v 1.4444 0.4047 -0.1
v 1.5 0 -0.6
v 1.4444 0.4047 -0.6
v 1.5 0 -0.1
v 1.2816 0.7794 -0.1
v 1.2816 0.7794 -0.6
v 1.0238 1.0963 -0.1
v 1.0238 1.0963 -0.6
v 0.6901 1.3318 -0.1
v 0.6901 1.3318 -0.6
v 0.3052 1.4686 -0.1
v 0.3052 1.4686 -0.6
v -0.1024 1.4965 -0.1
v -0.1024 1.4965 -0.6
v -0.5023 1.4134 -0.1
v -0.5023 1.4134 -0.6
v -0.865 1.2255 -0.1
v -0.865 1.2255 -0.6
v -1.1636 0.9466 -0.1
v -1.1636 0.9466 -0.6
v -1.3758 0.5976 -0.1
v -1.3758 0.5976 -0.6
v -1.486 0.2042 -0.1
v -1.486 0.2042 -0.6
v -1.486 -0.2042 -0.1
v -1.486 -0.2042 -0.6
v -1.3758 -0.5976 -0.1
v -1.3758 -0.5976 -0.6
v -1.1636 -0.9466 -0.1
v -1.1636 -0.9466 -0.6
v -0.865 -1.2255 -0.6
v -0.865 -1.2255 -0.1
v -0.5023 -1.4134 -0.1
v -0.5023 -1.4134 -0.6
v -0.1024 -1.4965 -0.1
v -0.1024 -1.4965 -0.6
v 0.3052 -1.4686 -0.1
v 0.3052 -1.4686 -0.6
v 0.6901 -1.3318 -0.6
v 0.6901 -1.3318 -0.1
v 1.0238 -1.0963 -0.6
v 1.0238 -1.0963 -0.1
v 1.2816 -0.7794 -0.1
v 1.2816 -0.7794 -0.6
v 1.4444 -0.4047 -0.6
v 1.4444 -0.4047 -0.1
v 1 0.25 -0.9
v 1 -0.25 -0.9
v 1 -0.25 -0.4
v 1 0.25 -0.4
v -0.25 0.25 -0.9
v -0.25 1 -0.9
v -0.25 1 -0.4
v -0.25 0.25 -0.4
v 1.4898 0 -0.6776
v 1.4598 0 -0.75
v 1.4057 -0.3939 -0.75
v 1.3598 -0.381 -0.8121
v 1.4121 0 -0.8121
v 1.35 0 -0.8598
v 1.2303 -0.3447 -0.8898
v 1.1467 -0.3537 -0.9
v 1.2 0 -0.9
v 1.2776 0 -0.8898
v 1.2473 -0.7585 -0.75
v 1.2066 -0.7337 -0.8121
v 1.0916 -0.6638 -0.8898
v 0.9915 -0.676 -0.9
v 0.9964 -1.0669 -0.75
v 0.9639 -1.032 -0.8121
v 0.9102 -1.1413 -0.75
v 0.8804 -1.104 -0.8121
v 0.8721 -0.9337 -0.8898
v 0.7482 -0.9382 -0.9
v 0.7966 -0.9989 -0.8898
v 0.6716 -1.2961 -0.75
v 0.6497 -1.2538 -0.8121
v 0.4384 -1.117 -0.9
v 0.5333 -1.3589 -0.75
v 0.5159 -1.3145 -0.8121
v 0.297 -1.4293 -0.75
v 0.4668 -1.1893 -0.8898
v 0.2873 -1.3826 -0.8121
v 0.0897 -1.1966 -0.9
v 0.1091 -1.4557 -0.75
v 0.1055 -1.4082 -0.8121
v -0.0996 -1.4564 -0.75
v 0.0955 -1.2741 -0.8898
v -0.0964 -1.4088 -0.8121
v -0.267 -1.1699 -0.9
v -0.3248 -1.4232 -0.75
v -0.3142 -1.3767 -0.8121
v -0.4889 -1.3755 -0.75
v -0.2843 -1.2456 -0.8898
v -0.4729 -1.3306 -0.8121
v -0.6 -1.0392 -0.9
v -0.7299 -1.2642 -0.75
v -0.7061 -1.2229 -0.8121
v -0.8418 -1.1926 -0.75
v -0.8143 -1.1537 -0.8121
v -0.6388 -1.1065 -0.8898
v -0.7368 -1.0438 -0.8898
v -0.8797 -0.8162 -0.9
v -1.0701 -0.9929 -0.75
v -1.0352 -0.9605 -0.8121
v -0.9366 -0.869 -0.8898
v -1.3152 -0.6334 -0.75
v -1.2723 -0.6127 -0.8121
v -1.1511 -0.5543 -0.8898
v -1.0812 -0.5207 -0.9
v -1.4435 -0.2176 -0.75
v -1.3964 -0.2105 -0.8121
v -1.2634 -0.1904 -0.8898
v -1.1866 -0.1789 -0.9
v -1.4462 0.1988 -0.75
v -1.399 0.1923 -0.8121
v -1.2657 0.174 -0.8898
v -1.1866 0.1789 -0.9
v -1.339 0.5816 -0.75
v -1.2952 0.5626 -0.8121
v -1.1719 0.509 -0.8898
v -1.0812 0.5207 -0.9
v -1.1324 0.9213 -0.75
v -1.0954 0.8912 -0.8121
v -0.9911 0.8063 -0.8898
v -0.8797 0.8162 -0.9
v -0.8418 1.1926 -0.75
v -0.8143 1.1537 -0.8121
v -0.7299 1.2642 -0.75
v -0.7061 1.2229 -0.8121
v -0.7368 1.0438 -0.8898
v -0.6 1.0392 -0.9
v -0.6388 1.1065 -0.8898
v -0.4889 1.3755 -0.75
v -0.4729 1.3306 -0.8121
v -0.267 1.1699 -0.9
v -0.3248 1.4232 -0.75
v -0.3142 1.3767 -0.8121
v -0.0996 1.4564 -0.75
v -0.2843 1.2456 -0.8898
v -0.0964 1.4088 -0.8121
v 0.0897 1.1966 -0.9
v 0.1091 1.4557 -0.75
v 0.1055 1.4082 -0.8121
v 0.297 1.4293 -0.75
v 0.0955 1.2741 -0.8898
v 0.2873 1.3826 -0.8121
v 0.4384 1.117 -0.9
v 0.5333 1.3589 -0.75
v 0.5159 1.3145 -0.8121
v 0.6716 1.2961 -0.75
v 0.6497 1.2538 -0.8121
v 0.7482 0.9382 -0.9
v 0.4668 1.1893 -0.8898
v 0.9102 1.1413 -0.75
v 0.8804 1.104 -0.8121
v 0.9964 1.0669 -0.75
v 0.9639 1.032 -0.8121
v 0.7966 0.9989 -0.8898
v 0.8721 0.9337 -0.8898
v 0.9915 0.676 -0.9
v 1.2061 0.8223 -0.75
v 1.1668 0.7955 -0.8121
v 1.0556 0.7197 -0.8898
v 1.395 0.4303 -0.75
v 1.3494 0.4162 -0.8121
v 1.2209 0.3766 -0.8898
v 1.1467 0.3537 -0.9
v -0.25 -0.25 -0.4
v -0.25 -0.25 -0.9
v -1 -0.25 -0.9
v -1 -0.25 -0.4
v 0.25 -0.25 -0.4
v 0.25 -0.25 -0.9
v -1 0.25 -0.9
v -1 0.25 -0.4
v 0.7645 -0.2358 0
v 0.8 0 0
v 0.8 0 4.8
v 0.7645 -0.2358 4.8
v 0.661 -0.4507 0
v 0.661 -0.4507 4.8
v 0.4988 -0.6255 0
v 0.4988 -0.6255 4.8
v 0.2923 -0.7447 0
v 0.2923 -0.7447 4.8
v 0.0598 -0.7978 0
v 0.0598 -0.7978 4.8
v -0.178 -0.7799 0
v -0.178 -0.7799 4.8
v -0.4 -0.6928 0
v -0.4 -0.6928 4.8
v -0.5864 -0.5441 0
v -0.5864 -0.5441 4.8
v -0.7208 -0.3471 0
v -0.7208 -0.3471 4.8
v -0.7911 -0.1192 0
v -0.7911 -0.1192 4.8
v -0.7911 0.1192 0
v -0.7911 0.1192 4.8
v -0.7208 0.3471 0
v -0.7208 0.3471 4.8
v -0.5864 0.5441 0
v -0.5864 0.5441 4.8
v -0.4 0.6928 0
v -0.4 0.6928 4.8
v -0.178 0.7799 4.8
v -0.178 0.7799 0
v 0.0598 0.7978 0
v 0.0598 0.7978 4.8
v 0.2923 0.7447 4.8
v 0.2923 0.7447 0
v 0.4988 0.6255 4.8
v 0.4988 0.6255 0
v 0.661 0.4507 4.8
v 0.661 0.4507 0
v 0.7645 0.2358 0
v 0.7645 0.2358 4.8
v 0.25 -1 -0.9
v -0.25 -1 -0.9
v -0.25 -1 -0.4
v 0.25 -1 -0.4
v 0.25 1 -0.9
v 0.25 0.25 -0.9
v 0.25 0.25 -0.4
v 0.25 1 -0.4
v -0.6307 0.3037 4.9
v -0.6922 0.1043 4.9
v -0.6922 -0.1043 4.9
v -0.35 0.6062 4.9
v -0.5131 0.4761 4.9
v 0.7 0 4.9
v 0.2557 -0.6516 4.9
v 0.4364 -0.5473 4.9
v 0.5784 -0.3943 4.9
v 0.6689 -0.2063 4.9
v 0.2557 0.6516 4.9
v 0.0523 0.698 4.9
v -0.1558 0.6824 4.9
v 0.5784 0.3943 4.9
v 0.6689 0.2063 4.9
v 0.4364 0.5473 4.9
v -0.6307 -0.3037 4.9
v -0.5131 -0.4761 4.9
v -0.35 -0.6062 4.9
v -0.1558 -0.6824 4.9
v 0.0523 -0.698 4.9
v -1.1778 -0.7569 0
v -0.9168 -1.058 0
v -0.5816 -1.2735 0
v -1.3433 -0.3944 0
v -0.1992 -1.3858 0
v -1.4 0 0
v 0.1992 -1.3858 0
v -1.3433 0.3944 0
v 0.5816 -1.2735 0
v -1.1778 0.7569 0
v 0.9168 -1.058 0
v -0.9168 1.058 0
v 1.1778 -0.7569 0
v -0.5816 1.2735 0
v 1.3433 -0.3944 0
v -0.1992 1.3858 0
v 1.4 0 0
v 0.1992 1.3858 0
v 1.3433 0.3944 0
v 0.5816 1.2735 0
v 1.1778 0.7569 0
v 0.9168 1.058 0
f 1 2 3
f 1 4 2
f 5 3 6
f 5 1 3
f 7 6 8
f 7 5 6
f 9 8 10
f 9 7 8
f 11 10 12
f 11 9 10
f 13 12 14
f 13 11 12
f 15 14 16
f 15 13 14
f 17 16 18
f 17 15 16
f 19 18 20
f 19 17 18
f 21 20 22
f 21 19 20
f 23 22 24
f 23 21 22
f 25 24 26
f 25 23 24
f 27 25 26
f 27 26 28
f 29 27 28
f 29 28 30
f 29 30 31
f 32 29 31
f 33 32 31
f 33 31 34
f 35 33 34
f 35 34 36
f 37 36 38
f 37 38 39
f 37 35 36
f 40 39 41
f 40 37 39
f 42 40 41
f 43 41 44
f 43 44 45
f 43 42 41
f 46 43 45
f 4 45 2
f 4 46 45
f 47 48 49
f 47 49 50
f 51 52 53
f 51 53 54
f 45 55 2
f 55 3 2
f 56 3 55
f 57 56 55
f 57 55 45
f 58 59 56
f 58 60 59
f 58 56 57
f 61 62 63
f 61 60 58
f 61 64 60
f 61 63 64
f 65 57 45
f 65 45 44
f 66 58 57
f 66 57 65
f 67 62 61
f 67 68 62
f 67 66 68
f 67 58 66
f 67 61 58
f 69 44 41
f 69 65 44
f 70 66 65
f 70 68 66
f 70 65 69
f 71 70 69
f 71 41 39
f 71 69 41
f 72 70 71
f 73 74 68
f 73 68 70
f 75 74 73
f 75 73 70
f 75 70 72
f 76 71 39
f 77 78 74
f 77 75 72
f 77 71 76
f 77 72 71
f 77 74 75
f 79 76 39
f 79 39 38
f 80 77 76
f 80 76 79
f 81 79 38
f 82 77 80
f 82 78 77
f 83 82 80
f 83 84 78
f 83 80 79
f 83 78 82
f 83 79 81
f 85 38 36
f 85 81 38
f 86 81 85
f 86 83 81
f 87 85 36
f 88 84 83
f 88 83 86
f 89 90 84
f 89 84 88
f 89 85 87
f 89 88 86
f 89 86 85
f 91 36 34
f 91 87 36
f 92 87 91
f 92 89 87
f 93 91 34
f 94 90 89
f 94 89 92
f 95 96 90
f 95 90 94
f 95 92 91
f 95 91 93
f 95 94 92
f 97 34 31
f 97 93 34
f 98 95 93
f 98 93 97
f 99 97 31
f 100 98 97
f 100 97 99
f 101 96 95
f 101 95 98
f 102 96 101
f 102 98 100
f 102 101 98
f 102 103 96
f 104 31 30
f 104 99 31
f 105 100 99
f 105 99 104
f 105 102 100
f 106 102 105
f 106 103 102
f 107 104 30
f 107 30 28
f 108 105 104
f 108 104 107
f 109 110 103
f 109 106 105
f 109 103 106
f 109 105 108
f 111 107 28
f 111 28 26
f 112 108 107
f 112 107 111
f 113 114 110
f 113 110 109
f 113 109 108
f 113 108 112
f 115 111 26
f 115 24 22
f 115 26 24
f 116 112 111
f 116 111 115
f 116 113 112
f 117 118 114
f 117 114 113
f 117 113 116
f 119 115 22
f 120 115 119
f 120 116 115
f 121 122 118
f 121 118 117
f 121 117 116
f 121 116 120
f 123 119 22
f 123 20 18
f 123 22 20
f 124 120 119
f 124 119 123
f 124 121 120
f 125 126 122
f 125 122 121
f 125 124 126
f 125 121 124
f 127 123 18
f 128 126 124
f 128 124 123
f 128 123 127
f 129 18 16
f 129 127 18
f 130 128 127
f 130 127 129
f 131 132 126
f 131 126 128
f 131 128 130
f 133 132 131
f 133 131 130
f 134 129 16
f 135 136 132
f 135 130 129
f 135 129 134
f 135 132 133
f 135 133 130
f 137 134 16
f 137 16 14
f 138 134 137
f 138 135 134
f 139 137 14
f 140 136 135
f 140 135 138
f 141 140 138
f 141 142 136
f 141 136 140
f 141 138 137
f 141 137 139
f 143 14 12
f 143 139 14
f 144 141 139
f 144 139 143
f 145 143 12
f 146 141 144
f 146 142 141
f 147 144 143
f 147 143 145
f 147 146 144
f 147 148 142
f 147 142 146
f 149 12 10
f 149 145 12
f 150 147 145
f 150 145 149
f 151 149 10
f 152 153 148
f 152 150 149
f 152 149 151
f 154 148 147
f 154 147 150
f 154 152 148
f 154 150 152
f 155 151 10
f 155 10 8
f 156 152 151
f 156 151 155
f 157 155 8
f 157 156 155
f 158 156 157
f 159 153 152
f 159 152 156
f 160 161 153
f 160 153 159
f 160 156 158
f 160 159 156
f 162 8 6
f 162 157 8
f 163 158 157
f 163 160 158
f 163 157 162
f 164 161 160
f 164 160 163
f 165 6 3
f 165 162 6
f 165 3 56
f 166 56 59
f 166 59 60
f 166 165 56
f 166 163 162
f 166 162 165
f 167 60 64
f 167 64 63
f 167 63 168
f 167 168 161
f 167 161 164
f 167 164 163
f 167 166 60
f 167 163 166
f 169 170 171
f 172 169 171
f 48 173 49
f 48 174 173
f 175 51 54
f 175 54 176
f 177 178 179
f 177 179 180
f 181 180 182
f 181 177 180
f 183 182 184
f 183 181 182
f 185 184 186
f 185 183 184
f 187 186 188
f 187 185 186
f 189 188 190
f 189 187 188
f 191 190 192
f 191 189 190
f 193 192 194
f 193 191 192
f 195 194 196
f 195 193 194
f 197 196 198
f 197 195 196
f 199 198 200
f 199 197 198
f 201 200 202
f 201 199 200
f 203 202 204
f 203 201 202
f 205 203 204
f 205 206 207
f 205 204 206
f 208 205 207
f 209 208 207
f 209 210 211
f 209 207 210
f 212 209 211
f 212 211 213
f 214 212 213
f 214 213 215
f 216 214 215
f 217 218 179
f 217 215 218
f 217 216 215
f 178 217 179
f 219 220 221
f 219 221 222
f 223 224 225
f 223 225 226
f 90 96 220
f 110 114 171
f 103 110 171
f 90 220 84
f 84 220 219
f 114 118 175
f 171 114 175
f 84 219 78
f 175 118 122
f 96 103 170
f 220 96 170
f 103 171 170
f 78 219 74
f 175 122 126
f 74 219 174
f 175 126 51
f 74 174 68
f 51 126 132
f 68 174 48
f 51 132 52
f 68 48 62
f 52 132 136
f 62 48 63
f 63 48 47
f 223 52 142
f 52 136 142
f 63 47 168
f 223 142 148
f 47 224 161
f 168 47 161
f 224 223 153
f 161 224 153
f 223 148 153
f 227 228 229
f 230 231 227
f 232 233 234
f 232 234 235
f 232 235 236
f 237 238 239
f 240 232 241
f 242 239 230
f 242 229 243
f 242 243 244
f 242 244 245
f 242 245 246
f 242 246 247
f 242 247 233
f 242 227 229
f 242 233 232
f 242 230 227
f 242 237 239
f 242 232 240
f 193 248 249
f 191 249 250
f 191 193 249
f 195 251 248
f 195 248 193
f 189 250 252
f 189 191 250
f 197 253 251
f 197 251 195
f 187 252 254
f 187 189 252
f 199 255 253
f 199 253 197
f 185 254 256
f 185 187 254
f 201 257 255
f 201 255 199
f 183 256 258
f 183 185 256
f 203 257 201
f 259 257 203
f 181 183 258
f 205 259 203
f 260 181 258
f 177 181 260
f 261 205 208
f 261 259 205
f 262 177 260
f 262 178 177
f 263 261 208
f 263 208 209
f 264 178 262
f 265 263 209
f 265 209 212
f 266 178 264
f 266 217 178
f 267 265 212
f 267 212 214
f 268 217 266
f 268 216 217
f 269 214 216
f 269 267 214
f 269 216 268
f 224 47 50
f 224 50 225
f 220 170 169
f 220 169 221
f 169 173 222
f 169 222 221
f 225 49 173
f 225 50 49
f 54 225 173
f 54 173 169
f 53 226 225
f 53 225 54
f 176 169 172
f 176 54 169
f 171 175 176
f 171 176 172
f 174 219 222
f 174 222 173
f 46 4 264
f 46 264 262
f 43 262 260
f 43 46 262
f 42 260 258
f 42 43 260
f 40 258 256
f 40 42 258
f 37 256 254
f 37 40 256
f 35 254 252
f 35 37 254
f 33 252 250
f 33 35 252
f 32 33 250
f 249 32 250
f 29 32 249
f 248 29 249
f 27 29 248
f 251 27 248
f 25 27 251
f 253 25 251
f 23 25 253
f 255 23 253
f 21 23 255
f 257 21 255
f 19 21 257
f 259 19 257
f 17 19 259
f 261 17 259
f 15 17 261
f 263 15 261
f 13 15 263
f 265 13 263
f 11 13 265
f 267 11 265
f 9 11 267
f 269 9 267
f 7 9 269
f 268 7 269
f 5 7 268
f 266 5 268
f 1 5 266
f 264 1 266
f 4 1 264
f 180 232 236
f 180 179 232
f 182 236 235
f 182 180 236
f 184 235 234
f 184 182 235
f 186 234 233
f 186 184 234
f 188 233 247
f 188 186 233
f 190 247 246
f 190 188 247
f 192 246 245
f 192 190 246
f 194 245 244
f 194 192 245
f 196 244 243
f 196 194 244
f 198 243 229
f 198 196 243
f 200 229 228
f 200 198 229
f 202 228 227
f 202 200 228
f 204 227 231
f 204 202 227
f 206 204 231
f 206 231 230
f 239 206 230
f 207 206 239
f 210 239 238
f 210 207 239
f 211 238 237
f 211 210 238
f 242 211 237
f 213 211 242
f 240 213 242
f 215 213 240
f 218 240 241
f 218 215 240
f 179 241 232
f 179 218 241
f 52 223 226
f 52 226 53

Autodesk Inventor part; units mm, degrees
ref_plane "YZ Plane" through (0, 0, 0) normal (1, 0, 0) x (0, 1, 0)
ref_plane "XZ Plane" through (0, 0, 0) normal (0, 1, 0) x (-1, 0, 0)
ref_plane "XY Plane" through (0, 0, 0) normal (0, 0, 1) x (1, 0, 0)
sketch "Sketch1" plane through (0, 0, 0) normal (0, 0, 1) x (1, 0, 0)
  circle A0 centre (0, 0) radius 1.5
  dimension "d0" = 3
extrude "Extrusion1" add sketch "Sketch1" against normal blind 0.9
sketch "Sketch2" plane through (0, 0, 0) normal (0, 0, 1) x (1, 0, 0)
  circle A0 centre (0, 0) radius 1.5 projected
  circle A1 centre (0, 0) radius 0.8
  dimension "d3" = 1.6
extrude "Extrusion2" add sketch "Sketch2" along normal blind 4.9 contours A1
fillet "Fillet1" radius 0.3 1 edges at (-1.5, 0, -0.9)
sketch "Sketch3" plane through (0, 0, -0.9) normal (0, 0, -1) x (-1, 0, 0)
  line L0 (-0.25, 0.25) -> (-0.25, 1)
  line L1 (-0.25, 1) -> (0.25, 1)
  line L2 (0.25, 1) -> (0.25, 0.25)
  line L3 (0.25, 0.25) -> (1, 0.25)
  line L4 (1, 0.25) -> (1, -0.25)
  line L5 (0.25, -0.25) -> (0.25, -1)
  line L6 (0.25, -1) -> (-0.25, -1)
  line L7 (-0.25, -1) -> (-0.25, -0.25)
  line L8 (-0.25, -0.25) -> (-1, -0.25)
  line L9 (-1, -0.25) -> (-1, 0.25)
  line L10 (-1, 0.25) -> (-0.25, 0.25)
  line L11 (0.25, -0.25) -> (1, -0.25)
  line L12 (2.1, 0) -> (-2.1, 0) construction
  line L13 (0, -2.1) -> (0, 2.1) construction
  point P0 (0, 0)
  dimension "d7" = 2
  dimension "d8" = 2
  dimension "d9" = 0.5
extrude "Extrusion3" cut sketch "Sketch3" against normal blind 0.5
chamfer "Chamfer1" distance 0.1 angle 45 2 edges at (-1.5, 0, 0) (-0.8, 0, 4.9)
properties part number "pan_head_screw_M1.6x5" material "Nickel-Copper Alloy 400"
